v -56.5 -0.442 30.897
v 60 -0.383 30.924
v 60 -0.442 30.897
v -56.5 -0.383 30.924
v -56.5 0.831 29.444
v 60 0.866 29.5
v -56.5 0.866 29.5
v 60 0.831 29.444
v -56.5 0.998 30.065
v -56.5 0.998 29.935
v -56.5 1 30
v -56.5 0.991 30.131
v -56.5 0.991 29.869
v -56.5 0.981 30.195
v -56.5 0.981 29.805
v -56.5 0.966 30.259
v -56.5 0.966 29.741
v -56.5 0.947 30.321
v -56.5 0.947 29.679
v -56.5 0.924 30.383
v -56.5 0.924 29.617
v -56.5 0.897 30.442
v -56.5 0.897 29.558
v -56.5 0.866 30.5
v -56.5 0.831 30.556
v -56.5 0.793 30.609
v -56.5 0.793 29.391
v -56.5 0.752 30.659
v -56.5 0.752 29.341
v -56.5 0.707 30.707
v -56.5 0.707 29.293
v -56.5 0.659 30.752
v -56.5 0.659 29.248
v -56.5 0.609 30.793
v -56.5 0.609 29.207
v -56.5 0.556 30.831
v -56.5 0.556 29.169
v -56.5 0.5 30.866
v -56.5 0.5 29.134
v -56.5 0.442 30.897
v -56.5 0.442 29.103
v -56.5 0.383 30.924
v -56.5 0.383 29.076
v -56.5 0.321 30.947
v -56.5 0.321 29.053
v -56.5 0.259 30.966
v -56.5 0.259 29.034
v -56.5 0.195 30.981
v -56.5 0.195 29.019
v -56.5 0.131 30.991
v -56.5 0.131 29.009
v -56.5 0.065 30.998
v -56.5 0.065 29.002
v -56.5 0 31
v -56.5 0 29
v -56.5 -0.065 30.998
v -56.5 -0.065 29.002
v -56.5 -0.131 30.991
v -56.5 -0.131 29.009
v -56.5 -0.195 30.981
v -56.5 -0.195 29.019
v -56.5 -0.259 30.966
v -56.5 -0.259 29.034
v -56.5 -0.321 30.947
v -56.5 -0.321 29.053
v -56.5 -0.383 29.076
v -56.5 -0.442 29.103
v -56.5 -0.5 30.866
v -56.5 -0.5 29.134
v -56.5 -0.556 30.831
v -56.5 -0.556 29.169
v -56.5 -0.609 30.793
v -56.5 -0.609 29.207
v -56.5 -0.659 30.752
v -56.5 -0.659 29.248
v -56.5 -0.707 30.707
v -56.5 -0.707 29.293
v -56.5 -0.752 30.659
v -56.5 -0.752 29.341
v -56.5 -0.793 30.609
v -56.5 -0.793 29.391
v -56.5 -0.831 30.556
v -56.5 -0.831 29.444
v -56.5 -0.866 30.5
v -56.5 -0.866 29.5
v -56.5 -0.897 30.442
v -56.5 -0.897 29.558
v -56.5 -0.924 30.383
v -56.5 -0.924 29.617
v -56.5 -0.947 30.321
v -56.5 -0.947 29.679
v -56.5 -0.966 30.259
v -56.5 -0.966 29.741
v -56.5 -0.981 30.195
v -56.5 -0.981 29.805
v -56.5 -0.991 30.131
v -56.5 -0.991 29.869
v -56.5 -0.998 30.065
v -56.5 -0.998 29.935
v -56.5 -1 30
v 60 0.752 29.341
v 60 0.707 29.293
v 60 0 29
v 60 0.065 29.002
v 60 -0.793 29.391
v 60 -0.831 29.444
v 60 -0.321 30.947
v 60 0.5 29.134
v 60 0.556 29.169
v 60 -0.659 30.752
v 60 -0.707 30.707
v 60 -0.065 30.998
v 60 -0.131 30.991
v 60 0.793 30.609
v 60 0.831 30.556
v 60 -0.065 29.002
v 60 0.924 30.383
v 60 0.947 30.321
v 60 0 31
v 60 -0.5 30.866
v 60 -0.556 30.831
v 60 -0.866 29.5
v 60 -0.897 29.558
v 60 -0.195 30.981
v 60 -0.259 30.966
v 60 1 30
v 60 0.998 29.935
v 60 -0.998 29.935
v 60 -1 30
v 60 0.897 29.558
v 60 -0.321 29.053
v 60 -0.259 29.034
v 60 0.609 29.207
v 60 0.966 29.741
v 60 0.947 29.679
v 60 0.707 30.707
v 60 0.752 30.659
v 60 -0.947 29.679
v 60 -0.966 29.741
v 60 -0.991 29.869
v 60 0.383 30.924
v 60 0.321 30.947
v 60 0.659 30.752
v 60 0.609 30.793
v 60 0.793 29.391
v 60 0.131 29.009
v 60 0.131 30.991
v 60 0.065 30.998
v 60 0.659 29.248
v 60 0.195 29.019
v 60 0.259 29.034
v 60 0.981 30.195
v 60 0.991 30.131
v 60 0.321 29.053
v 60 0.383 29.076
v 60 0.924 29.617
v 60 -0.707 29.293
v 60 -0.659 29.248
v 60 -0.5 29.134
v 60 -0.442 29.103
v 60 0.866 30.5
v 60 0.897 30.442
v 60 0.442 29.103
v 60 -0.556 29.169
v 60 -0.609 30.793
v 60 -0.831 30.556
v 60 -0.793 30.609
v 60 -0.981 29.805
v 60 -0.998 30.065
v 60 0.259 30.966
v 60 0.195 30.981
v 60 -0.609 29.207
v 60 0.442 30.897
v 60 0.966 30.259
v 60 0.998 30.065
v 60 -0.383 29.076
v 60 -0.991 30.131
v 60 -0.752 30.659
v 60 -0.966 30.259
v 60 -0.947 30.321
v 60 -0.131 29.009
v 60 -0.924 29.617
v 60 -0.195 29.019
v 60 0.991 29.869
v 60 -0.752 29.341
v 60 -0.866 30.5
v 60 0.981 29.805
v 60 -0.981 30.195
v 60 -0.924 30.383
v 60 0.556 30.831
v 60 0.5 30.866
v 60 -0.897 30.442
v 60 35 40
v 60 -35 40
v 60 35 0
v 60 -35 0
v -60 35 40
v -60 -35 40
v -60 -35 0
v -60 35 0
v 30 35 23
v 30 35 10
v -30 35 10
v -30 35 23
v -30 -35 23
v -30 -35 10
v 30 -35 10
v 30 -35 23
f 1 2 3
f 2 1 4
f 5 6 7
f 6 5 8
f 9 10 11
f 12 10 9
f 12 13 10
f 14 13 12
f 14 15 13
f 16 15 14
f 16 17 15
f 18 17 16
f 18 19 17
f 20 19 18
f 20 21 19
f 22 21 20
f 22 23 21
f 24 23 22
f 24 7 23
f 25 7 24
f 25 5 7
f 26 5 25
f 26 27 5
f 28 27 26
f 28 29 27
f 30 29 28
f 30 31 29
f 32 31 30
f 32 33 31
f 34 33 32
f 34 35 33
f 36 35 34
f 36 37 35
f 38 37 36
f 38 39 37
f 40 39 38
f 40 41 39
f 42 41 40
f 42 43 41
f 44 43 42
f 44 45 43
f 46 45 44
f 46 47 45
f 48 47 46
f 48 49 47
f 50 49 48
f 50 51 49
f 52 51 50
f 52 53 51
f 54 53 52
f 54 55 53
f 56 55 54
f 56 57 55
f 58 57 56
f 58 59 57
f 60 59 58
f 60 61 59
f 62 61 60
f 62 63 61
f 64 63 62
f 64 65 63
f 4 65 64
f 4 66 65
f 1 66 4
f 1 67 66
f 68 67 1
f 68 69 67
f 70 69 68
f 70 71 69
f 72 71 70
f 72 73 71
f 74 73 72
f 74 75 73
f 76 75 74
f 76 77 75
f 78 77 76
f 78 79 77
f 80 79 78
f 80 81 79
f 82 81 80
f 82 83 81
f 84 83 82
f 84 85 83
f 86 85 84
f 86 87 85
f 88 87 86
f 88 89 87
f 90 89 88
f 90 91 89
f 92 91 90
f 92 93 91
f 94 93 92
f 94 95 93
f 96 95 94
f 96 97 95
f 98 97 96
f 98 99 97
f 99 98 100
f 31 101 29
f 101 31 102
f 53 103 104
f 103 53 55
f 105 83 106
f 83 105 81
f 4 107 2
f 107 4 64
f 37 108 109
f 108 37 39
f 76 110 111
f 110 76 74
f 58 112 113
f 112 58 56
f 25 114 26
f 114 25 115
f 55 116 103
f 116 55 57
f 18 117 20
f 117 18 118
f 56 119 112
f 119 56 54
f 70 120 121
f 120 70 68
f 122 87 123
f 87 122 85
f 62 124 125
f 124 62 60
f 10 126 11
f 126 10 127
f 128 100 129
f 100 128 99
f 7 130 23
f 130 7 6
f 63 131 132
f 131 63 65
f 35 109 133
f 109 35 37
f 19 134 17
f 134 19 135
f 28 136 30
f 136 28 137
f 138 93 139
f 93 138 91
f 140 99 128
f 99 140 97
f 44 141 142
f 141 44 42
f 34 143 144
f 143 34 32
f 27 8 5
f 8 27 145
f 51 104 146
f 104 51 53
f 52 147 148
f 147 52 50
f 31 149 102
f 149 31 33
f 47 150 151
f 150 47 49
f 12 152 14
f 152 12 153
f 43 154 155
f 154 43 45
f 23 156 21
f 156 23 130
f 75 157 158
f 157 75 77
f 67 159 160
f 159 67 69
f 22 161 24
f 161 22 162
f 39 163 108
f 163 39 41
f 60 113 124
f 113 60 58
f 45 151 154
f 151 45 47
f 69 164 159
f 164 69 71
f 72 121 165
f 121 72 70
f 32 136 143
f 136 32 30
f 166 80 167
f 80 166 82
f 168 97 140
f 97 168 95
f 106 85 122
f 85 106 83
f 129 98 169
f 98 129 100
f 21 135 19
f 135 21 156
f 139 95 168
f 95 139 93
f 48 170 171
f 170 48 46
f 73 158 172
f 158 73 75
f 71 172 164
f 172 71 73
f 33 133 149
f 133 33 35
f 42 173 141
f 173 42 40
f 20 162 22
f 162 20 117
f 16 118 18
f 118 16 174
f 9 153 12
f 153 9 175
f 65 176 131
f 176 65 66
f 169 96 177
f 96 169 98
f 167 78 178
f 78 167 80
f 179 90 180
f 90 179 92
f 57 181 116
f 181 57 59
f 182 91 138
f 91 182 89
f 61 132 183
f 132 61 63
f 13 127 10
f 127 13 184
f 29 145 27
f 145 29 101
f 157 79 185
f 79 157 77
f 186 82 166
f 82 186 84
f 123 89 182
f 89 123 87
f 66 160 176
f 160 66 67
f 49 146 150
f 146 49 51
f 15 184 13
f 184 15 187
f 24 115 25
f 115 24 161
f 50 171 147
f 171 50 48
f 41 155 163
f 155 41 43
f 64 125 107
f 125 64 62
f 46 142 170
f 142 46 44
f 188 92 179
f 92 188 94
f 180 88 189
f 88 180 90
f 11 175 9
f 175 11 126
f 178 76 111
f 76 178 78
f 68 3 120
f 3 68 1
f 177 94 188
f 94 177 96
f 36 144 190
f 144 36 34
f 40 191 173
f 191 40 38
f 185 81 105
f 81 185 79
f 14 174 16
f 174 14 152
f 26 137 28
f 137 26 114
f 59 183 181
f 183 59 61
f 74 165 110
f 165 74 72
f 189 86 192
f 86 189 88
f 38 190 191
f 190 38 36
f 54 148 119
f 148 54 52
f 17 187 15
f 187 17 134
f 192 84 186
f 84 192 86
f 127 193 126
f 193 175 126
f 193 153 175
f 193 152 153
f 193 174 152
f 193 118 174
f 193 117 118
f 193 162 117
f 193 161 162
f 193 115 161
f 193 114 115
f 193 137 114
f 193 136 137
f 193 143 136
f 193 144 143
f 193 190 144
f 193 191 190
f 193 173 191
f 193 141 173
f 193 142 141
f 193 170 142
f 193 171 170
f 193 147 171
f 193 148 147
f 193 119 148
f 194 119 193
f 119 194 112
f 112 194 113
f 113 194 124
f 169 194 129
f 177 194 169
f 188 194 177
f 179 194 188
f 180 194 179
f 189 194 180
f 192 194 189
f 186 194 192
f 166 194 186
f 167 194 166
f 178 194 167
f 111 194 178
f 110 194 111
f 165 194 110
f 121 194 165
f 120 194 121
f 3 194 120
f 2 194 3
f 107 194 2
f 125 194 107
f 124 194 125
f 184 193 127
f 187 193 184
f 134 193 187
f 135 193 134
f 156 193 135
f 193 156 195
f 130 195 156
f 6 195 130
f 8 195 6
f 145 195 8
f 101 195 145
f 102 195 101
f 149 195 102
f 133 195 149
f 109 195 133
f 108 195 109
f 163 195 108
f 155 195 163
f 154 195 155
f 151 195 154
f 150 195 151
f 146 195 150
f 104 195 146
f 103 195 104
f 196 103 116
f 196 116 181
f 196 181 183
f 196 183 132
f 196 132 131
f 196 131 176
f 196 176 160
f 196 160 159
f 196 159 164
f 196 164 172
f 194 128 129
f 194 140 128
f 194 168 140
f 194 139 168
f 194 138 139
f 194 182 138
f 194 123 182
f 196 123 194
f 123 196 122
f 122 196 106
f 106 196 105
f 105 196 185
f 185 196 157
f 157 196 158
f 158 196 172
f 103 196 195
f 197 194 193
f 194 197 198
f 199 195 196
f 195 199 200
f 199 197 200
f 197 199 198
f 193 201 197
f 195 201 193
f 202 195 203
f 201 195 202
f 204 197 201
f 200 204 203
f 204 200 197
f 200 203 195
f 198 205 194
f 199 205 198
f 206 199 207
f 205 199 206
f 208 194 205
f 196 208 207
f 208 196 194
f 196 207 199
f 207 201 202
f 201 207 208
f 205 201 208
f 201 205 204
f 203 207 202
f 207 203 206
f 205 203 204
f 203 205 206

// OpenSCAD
// Mini horizontal gel-electrophoresis buffer tank
// Print orientation: tank rests on XY plane at z = 0, builds upward (+Z)

// ---------------- Parameters ----------------
tank_x      = 120;   // tank outer length (X)
tank_y      = 70;    // tank outer width (Y)
tank_z      = 40;    // tank outer height (Z)
wall        = 3;     // wall thickness
floor       = 3;     // floor thickness (bottom slab)

platform_x  = 60;    // platform length in X (centred)
platform_y  = tank_y; // platform spans full inner width (Y)
platform_top_z = 13; // platform top height above tank floor (z = floor + 10)

hole_d      = 2;     // electrode wire hole diameter
hole_y      = 0;     // hole centre Y position
hole_z      = 30;    // hole centre Z position

eps         = 0.5;   // cutter overshoot past faces
$fn         = 96;    // curve resolution

// ---------------- Derived ----------------
inner_x = tank_x - 2 * wall;   // 114
inner_y = tank_y - 2 * wall;   // 64
inner_z = tank_z - wall;       // 37 (floor included)

// ---------------- Model ----------------
difference() {
    // Tank body: outer block with open top (cut through at z = tank_z)
    translate([-tank_x / 2, -tank_y / 2, 0])
        cube([tank_x, tank_y, tank_z]);

    // Gel tray platform (solid, divides bottom into two chambers)
    translate([-platform_x / 2, -platform_y / 2, platform_top_z - floor])
        cube([platform_x, platform_y, floor + 10]);

    // Electrode wire holes through each end wall, along X
    for (sx = [-1, 1])
        translate([sx * (inner_x / 2 - eps), hole_y, hole_z])
            rotate([0, 90, 0])
                cylinder(d = hole_d, h = inner_x + 2 * eps);
}
